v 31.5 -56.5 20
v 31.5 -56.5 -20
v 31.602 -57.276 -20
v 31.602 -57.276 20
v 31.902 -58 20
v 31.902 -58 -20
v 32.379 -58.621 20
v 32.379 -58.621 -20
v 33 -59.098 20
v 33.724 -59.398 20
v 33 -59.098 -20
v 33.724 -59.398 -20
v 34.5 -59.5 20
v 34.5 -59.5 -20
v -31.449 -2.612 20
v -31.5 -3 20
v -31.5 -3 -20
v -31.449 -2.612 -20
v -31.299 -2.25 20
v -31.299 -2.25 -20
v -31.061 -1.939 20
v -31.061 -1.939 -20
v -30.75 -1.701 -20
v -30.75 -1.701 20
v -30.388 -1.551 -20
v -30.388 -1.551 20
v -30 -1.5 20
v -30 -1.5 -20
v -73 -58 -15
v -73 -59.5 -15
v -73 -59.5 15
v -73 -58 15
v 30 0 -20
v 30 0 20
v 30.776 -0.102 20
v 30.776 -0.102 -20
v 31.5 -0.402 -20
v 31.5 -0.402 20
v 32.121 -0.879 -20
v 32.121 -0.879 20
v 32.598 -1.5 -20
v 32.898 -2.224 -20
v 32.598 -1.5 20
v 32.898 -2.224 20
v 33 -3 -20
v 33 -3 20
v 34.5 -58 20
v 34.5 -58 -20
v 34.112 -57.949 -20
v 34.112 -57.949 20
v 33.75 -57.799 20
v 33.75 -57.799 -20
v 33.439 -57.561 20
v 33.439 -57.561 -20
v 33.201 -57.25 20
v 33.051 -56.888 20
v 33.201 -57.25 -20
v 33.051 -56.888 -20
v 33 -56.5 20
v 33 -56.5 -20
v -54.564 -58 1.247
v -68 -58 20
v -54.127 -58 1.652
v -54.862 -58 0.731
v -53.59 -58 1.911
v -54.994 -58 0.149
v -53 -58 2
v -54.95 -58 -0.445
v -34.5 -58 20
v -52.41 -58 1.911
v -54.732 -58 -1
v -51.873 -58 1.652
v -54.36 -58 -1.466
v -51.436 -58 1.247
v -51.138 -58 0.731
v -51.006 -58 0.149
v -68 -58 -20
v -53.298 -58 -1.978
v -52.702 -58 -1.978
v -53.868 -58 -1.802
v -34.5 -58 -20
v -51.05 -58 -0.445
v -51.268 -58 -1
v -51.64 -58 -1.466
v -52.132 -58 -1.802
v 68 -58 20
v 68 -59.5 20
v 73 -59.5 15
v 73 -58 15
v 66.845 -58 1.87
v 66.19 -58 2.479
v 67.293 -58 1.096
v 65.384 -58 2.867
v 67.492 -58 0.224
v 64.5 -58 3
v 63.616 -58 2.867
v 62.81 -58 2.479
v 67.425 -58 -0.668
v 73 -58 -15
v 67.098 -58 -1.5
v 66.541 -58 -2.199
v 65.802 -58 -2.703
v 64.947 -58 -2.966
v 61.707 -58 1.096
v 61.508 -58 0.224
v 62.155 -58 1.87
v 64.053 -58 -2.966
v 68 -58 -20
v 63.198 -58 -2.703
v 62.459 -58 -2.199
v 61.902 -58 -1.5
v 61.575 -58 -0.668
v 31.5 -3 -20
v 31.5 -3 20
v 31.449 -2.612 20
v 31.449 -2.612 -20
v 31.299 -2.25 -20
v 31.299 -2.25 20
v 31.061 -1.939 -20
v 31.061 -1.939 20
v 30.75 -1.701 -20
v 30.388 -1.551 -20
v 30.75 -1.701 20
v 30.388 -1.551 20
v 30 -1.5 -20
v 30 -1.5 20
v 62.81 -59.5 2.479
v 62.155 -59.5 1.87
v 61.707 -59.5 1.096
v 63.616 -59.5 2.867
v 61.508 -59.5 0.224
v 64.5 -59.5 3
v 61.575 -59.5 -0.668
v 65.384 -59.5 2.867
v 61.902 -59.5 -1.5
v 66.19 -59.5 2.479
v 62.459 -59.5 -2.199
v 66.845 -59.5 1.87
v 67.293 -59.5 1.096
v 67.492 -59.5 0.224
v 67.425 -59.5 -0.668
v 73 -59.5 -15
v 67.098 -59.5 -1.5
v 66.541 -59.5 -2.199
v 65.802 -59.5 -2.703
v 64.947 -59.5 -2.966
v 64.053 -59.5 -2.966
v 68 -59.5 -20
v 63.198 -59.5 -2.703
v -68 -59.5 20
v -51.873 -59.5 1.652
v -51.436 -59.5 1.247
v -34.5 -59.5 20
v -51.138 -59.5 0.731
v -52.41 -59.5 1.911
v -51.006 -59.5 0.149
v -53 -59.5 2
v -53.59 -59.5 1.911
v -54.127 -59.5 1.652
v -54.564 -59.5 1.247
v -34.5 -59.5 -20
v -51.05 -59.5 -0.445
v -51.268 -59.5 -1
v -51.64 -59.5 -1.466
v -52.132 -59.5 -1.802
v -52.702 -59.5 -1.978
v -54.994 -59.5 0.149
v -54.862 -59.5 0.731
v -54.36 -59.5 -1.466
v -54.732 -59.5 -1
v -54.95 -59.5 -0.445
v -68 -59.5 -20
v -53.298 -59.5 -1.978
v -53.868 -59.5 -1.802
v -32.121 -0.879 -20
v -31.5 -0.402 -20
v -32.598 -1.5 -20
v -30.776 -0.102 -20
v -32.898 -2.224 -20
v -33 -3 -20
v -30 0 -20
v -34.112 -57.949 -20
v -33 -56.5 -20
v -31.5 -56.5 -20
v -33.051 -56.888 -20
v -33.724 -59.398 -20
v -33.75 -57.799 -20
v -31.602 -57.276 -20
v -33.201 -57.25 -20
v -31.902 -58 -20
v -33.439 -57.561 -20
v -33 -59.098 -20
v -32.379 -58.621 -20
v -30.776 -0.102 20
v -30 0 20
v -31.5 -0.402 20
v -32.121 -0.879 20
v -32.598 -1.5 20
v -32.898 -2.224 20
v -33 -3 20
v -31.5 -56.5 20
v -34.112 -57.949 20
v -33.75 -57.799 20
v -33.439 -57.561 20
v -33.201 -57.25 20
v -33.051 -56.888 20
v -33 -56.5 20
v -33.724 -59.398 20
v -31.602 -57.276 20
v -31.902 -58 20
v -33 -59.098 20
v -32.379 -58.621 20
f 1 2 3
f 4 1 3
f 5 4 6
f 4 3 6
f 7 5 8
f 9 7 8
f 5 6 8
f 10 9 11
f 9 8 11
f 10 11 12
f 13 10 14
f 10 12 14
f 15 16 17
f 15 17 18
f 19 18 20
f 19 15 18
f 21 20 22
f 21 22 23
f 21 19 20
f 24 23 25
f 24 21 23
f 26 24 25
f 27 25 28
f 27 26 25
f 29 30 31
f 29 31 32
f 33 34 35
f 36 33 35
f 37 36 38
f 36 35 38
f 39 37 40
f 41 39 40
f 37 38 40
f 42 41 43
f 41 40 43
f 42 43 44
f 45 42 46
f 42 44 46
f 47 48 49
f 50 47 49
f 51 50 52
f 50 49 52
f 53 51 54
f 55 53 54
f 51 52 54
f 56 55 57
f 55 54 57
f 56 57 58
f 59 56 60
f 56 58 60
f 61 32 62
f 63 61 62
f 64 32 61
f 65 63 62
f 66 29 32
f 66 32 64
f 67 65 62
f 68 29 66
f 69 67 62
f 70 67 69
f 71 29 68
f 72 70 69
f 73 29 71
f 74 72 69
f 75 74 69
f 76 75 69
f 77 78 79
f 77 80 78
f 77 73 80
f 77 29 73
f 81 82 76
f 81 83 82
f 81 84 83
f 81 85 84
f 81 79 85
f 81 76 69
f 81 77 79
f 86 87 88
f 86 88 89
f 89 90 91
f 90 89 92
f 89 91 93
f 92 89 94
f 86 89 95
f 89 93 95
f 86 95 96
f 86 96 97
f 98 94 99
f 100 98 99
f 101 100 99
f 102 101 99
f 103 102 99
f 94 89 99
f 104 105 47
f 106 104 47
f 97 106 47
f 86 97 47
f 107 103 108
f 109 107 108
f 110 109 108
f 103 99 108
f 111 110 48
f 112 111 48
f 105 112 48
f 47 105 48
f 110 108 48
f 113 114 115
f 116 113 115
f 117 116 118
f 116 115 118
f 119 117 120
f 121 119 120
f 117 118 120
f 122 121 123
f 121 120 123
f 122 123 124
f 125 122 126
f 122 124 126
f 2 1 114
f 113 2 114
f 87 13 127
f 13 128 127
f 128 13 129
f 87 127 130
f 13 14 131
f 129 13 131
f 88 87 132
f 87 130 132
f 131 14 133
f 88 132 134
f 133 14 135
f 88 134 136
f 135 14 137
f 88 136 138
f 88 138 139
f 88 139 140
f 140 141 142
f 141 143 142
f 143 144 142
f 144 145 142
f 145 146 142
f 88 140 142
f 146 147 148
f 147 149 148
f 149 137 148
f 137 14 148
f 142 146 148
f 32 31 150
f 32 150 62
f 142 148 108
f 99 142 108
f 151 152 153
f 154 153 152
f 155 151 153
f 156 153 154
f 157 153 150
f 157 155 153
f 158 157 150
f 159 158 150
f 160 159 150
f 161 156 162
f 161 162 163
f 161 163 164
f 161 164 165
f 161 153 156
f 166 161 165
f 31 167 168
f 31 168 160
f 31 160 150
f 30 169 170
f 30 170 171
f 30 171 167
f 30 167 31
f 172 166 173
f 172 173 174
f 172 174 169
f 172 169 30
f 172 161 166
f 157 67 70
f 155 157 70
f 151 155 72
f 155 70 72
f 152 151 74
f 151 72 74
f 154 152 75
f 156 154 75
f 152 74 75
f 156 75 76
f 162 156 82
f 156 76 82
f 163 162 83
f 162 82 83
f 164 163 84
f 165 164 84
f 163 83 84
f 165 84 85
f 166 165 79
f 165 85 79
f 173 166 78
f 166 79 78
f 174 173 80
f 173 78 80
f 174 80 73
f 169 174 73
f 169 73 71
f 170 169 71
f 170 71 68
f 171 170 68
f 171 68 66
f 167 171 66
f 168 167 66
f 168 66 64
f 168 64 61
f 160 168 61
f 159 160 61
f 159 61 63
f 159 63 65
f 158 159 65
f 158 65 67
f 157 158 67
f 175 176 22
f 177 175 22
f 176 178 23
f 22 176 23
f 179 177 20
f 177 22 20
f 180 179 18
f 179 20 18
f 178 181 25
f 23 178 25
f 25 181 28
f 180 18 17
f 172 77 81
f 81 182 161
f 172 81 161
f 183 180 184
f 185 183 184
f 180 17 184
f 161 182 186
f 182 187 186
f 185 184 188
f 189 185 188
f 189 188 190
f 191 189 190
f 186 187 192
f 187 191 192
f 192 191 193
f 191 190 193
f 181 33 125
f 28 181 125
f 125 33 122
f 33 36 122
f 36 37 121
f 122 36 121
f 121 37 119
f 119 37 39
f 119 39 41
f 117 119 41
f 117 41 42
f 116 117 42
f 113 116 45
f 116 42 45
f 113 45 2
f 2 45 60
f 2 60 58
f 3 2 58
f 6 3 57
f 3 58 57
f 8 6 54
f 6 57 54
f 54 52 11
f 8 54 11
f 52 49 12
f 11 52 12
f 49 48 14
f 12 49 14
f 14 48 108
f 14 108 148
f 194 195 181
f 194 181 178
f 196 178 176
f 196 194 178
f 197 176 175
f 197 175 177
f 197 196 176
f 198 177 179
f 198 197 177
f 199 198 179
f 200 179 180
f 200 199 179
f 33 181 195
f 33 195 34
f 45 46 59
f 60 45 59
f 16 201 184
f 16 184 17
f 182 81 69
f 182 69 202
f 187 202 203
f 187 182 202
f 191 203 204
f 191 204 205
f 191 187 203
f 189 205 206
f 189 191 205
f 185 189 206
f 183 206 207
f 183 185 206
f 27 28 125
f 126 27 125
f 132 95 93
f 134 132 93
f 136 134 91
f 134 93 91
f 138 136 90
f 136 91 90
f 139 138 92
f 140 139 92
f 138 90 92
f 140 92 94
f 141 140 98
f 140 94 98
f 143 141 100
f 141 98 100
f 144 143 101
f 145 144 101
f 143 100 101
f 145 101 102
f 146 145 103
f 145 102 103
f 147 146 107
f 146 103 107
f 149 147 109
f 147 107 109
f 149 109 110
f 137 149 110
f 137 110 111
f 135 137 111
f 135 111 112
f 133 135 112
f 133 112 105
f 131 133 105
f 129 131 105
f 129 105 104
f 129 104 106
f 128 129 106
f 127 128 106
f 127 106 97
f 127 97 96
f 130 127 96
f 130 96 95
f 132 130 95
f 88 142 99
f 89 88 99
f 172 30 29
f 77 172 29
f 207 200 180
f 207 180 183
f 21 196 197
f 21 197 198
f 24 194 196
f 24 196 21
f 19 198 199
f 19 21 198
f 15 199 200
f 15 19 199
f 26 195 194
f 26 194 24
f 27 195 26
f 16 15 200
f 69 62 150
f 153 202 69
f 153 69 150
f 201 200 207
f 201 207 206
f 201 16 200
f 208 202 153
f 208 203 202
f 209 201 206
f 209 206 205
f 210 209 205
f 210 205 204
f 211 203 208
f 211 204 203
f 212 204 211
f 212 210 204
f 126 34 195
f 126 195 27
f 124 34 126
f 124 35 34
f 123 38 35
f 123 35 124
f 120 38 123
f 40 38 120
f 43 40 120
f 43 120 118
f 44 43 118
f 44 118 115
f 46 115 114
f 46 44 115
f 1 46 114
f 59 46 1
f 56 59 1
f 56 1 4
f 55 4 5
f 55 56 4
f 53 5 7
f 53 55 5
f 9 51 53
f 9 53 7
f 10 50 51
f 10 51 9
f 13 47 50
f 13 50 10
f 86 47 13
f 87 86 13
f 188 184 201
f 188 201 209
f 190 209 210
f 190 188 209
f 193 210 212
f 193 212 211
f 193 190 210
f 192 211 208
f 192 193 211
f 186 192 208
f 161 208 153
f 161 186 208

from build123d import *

# Parameters (mm, degrees)
SKETCH1_W          = 60
SKETCH1_H          = 40
BASE_FLANGE1_DEPTH = 1.5
EDGE_FLANGE1_DEPTH = 40
EDGE_FLANGE2_DEPTH = 40
CHAMFER1_SIZE      = 5
CUT_EXTRUDE1_REACH = 97.357
SKETCH10_R         = 2
SKETCH10_R_2       = 3


# Sheet-metal steps are written as plain solids
with BuildPart() as part:
    # Sketch1 → Base-Flange1 (new body)
    with BuildSketch(Plane(origin=(0, 0, 0), x_dir=(1, 0, 0), z_dir=(0, 1, 0))):
        Rectangle(SKETCH1_W, SKETCH1_H)
    extrude(amount=-BASE_FLANGE1_DEPTH)

    # Edge-Flange1 section (across the edge) → Edge-Flange1 (add)
    with BuildSketch(Plane(origin=(-31.5, -1.5, 20), x_dir=(1, 0, 0), z_dir=(0, 0, -1))):
        with BuildLine():
            Line((-1.5, 1.5), (-1.5, 55))
            Line((-1.5, 55), (0, 55))
            Line((0, 55), (0, 1.5))
            ThreePointArc((0, 1.5), (0.439339828, 0.439339828), (1.5, 0))
            Line((1.5, 0), (1.5, -1.5))
            ThreePointArc((1.5, -1.5), (-0.621320344, -0.621320344), (-1.5, 1.5))
        make_face()
    edge_flange1 = extrude(amount=EDGE_FLANGE1_DEPTH)

    # Edge-Flange2 section (across the edge) → Edge-Flange2 (add)
    with BuildSketch(Plane(origin=(-33, -58, -20), x_dir=(0, 1, 0), z_dir=(0, 0, 1))):
        with BuildLine():
            Line((-1.5, 1.5), (-1.5, 40))
            Line((-1.5, 40), (0, 40))
            Line((0, 40), (0, 1.5))
            ThreePointArc((0, 1.5), (0.439339828, 0.439339828), (1.5, 0))
            Line((1.5, 0), (1.5, -1.5))
            ThreePointArc((1.5, -1.5), (-0.621320344, -0.621320344), (-1.5, 1.5))
        make_face()
    edge_flange2 = extrude(amount=EDGE_FLANGE2_DEPTH)

    # Mirror1: Edge-Flange1, Edge-Flange2 across plane
    add(edge_flange1.mirror(Plane(origin=(0, 0, 0), x_dir=(0, 0, 1), z_dir=(1, 0, 0))))
    add(edge_flange2.mirror(Plane(origin=(0, 0, 0), x_dir=(0, 0, 1), z_dir=(1, 0, 0))))

    # Chamfer1
    chamfer1_edges = [part.edges().sort_by_distance(p)[0] for p in [
        (-73, -58.75, -20),
        (-73, -58.75, 20),
        (73, -58.75, 20),
        (73, -58.75, -20),
    ]]
    chamfer(chamfer1_edges, length=CHAMFER1_SIZE)

    # Sketch10 → Cut-Extrude1 (cut, up to next)
    with BuildSketch(Plane(origin=(0, -58, 0), x_dir=(1, 0, 0), z_dir=(0, 1, 0)), mode=Mode.PRIVATE) as cut_extrude1_sk1:
        with Locations(Location((-53, 0, 0), (0, 0, 270))):
            Circle(SKETCH10_R)
    cut_extrude1_tool1 = extrude(cut_extrude1_sk1.sketch, amount=-CUT_EXTRUDE1_REACH, mode=Mode.PRIVATE) & part.part
    # Sketch10 → Cut-Extrude1 (cut, up to next)
    with BuildSketch(Plane(origin=(0, -58, 0), x_dir=(1, 0, 0), z_dir=(0, 1, 0)), mode=Mode.PRIVATE) as cut_extrude1_sk2:
        with Locations(Location((64.5, 0, 0), (0, 0, 270))):
            Circle(SKETCH10_R_2)
    cut_extrude1_tool2 = extrude(cut_extrude1_sk2.sketch, amount=-CUT_EXTRUDE1_REACH, mode=Mode.PRIVATE) & part.part
    add(cut_extrude1_tool1.solids().sort_by_distance((-53, -58, 0))[0], mode=Mode.SUBTRACT)
    add(cut_extrude1_tool2.solids().sort_by_distance((64.5, -58, 0))[0], mode=Mode.SUBTRACT)


solid = part.part
